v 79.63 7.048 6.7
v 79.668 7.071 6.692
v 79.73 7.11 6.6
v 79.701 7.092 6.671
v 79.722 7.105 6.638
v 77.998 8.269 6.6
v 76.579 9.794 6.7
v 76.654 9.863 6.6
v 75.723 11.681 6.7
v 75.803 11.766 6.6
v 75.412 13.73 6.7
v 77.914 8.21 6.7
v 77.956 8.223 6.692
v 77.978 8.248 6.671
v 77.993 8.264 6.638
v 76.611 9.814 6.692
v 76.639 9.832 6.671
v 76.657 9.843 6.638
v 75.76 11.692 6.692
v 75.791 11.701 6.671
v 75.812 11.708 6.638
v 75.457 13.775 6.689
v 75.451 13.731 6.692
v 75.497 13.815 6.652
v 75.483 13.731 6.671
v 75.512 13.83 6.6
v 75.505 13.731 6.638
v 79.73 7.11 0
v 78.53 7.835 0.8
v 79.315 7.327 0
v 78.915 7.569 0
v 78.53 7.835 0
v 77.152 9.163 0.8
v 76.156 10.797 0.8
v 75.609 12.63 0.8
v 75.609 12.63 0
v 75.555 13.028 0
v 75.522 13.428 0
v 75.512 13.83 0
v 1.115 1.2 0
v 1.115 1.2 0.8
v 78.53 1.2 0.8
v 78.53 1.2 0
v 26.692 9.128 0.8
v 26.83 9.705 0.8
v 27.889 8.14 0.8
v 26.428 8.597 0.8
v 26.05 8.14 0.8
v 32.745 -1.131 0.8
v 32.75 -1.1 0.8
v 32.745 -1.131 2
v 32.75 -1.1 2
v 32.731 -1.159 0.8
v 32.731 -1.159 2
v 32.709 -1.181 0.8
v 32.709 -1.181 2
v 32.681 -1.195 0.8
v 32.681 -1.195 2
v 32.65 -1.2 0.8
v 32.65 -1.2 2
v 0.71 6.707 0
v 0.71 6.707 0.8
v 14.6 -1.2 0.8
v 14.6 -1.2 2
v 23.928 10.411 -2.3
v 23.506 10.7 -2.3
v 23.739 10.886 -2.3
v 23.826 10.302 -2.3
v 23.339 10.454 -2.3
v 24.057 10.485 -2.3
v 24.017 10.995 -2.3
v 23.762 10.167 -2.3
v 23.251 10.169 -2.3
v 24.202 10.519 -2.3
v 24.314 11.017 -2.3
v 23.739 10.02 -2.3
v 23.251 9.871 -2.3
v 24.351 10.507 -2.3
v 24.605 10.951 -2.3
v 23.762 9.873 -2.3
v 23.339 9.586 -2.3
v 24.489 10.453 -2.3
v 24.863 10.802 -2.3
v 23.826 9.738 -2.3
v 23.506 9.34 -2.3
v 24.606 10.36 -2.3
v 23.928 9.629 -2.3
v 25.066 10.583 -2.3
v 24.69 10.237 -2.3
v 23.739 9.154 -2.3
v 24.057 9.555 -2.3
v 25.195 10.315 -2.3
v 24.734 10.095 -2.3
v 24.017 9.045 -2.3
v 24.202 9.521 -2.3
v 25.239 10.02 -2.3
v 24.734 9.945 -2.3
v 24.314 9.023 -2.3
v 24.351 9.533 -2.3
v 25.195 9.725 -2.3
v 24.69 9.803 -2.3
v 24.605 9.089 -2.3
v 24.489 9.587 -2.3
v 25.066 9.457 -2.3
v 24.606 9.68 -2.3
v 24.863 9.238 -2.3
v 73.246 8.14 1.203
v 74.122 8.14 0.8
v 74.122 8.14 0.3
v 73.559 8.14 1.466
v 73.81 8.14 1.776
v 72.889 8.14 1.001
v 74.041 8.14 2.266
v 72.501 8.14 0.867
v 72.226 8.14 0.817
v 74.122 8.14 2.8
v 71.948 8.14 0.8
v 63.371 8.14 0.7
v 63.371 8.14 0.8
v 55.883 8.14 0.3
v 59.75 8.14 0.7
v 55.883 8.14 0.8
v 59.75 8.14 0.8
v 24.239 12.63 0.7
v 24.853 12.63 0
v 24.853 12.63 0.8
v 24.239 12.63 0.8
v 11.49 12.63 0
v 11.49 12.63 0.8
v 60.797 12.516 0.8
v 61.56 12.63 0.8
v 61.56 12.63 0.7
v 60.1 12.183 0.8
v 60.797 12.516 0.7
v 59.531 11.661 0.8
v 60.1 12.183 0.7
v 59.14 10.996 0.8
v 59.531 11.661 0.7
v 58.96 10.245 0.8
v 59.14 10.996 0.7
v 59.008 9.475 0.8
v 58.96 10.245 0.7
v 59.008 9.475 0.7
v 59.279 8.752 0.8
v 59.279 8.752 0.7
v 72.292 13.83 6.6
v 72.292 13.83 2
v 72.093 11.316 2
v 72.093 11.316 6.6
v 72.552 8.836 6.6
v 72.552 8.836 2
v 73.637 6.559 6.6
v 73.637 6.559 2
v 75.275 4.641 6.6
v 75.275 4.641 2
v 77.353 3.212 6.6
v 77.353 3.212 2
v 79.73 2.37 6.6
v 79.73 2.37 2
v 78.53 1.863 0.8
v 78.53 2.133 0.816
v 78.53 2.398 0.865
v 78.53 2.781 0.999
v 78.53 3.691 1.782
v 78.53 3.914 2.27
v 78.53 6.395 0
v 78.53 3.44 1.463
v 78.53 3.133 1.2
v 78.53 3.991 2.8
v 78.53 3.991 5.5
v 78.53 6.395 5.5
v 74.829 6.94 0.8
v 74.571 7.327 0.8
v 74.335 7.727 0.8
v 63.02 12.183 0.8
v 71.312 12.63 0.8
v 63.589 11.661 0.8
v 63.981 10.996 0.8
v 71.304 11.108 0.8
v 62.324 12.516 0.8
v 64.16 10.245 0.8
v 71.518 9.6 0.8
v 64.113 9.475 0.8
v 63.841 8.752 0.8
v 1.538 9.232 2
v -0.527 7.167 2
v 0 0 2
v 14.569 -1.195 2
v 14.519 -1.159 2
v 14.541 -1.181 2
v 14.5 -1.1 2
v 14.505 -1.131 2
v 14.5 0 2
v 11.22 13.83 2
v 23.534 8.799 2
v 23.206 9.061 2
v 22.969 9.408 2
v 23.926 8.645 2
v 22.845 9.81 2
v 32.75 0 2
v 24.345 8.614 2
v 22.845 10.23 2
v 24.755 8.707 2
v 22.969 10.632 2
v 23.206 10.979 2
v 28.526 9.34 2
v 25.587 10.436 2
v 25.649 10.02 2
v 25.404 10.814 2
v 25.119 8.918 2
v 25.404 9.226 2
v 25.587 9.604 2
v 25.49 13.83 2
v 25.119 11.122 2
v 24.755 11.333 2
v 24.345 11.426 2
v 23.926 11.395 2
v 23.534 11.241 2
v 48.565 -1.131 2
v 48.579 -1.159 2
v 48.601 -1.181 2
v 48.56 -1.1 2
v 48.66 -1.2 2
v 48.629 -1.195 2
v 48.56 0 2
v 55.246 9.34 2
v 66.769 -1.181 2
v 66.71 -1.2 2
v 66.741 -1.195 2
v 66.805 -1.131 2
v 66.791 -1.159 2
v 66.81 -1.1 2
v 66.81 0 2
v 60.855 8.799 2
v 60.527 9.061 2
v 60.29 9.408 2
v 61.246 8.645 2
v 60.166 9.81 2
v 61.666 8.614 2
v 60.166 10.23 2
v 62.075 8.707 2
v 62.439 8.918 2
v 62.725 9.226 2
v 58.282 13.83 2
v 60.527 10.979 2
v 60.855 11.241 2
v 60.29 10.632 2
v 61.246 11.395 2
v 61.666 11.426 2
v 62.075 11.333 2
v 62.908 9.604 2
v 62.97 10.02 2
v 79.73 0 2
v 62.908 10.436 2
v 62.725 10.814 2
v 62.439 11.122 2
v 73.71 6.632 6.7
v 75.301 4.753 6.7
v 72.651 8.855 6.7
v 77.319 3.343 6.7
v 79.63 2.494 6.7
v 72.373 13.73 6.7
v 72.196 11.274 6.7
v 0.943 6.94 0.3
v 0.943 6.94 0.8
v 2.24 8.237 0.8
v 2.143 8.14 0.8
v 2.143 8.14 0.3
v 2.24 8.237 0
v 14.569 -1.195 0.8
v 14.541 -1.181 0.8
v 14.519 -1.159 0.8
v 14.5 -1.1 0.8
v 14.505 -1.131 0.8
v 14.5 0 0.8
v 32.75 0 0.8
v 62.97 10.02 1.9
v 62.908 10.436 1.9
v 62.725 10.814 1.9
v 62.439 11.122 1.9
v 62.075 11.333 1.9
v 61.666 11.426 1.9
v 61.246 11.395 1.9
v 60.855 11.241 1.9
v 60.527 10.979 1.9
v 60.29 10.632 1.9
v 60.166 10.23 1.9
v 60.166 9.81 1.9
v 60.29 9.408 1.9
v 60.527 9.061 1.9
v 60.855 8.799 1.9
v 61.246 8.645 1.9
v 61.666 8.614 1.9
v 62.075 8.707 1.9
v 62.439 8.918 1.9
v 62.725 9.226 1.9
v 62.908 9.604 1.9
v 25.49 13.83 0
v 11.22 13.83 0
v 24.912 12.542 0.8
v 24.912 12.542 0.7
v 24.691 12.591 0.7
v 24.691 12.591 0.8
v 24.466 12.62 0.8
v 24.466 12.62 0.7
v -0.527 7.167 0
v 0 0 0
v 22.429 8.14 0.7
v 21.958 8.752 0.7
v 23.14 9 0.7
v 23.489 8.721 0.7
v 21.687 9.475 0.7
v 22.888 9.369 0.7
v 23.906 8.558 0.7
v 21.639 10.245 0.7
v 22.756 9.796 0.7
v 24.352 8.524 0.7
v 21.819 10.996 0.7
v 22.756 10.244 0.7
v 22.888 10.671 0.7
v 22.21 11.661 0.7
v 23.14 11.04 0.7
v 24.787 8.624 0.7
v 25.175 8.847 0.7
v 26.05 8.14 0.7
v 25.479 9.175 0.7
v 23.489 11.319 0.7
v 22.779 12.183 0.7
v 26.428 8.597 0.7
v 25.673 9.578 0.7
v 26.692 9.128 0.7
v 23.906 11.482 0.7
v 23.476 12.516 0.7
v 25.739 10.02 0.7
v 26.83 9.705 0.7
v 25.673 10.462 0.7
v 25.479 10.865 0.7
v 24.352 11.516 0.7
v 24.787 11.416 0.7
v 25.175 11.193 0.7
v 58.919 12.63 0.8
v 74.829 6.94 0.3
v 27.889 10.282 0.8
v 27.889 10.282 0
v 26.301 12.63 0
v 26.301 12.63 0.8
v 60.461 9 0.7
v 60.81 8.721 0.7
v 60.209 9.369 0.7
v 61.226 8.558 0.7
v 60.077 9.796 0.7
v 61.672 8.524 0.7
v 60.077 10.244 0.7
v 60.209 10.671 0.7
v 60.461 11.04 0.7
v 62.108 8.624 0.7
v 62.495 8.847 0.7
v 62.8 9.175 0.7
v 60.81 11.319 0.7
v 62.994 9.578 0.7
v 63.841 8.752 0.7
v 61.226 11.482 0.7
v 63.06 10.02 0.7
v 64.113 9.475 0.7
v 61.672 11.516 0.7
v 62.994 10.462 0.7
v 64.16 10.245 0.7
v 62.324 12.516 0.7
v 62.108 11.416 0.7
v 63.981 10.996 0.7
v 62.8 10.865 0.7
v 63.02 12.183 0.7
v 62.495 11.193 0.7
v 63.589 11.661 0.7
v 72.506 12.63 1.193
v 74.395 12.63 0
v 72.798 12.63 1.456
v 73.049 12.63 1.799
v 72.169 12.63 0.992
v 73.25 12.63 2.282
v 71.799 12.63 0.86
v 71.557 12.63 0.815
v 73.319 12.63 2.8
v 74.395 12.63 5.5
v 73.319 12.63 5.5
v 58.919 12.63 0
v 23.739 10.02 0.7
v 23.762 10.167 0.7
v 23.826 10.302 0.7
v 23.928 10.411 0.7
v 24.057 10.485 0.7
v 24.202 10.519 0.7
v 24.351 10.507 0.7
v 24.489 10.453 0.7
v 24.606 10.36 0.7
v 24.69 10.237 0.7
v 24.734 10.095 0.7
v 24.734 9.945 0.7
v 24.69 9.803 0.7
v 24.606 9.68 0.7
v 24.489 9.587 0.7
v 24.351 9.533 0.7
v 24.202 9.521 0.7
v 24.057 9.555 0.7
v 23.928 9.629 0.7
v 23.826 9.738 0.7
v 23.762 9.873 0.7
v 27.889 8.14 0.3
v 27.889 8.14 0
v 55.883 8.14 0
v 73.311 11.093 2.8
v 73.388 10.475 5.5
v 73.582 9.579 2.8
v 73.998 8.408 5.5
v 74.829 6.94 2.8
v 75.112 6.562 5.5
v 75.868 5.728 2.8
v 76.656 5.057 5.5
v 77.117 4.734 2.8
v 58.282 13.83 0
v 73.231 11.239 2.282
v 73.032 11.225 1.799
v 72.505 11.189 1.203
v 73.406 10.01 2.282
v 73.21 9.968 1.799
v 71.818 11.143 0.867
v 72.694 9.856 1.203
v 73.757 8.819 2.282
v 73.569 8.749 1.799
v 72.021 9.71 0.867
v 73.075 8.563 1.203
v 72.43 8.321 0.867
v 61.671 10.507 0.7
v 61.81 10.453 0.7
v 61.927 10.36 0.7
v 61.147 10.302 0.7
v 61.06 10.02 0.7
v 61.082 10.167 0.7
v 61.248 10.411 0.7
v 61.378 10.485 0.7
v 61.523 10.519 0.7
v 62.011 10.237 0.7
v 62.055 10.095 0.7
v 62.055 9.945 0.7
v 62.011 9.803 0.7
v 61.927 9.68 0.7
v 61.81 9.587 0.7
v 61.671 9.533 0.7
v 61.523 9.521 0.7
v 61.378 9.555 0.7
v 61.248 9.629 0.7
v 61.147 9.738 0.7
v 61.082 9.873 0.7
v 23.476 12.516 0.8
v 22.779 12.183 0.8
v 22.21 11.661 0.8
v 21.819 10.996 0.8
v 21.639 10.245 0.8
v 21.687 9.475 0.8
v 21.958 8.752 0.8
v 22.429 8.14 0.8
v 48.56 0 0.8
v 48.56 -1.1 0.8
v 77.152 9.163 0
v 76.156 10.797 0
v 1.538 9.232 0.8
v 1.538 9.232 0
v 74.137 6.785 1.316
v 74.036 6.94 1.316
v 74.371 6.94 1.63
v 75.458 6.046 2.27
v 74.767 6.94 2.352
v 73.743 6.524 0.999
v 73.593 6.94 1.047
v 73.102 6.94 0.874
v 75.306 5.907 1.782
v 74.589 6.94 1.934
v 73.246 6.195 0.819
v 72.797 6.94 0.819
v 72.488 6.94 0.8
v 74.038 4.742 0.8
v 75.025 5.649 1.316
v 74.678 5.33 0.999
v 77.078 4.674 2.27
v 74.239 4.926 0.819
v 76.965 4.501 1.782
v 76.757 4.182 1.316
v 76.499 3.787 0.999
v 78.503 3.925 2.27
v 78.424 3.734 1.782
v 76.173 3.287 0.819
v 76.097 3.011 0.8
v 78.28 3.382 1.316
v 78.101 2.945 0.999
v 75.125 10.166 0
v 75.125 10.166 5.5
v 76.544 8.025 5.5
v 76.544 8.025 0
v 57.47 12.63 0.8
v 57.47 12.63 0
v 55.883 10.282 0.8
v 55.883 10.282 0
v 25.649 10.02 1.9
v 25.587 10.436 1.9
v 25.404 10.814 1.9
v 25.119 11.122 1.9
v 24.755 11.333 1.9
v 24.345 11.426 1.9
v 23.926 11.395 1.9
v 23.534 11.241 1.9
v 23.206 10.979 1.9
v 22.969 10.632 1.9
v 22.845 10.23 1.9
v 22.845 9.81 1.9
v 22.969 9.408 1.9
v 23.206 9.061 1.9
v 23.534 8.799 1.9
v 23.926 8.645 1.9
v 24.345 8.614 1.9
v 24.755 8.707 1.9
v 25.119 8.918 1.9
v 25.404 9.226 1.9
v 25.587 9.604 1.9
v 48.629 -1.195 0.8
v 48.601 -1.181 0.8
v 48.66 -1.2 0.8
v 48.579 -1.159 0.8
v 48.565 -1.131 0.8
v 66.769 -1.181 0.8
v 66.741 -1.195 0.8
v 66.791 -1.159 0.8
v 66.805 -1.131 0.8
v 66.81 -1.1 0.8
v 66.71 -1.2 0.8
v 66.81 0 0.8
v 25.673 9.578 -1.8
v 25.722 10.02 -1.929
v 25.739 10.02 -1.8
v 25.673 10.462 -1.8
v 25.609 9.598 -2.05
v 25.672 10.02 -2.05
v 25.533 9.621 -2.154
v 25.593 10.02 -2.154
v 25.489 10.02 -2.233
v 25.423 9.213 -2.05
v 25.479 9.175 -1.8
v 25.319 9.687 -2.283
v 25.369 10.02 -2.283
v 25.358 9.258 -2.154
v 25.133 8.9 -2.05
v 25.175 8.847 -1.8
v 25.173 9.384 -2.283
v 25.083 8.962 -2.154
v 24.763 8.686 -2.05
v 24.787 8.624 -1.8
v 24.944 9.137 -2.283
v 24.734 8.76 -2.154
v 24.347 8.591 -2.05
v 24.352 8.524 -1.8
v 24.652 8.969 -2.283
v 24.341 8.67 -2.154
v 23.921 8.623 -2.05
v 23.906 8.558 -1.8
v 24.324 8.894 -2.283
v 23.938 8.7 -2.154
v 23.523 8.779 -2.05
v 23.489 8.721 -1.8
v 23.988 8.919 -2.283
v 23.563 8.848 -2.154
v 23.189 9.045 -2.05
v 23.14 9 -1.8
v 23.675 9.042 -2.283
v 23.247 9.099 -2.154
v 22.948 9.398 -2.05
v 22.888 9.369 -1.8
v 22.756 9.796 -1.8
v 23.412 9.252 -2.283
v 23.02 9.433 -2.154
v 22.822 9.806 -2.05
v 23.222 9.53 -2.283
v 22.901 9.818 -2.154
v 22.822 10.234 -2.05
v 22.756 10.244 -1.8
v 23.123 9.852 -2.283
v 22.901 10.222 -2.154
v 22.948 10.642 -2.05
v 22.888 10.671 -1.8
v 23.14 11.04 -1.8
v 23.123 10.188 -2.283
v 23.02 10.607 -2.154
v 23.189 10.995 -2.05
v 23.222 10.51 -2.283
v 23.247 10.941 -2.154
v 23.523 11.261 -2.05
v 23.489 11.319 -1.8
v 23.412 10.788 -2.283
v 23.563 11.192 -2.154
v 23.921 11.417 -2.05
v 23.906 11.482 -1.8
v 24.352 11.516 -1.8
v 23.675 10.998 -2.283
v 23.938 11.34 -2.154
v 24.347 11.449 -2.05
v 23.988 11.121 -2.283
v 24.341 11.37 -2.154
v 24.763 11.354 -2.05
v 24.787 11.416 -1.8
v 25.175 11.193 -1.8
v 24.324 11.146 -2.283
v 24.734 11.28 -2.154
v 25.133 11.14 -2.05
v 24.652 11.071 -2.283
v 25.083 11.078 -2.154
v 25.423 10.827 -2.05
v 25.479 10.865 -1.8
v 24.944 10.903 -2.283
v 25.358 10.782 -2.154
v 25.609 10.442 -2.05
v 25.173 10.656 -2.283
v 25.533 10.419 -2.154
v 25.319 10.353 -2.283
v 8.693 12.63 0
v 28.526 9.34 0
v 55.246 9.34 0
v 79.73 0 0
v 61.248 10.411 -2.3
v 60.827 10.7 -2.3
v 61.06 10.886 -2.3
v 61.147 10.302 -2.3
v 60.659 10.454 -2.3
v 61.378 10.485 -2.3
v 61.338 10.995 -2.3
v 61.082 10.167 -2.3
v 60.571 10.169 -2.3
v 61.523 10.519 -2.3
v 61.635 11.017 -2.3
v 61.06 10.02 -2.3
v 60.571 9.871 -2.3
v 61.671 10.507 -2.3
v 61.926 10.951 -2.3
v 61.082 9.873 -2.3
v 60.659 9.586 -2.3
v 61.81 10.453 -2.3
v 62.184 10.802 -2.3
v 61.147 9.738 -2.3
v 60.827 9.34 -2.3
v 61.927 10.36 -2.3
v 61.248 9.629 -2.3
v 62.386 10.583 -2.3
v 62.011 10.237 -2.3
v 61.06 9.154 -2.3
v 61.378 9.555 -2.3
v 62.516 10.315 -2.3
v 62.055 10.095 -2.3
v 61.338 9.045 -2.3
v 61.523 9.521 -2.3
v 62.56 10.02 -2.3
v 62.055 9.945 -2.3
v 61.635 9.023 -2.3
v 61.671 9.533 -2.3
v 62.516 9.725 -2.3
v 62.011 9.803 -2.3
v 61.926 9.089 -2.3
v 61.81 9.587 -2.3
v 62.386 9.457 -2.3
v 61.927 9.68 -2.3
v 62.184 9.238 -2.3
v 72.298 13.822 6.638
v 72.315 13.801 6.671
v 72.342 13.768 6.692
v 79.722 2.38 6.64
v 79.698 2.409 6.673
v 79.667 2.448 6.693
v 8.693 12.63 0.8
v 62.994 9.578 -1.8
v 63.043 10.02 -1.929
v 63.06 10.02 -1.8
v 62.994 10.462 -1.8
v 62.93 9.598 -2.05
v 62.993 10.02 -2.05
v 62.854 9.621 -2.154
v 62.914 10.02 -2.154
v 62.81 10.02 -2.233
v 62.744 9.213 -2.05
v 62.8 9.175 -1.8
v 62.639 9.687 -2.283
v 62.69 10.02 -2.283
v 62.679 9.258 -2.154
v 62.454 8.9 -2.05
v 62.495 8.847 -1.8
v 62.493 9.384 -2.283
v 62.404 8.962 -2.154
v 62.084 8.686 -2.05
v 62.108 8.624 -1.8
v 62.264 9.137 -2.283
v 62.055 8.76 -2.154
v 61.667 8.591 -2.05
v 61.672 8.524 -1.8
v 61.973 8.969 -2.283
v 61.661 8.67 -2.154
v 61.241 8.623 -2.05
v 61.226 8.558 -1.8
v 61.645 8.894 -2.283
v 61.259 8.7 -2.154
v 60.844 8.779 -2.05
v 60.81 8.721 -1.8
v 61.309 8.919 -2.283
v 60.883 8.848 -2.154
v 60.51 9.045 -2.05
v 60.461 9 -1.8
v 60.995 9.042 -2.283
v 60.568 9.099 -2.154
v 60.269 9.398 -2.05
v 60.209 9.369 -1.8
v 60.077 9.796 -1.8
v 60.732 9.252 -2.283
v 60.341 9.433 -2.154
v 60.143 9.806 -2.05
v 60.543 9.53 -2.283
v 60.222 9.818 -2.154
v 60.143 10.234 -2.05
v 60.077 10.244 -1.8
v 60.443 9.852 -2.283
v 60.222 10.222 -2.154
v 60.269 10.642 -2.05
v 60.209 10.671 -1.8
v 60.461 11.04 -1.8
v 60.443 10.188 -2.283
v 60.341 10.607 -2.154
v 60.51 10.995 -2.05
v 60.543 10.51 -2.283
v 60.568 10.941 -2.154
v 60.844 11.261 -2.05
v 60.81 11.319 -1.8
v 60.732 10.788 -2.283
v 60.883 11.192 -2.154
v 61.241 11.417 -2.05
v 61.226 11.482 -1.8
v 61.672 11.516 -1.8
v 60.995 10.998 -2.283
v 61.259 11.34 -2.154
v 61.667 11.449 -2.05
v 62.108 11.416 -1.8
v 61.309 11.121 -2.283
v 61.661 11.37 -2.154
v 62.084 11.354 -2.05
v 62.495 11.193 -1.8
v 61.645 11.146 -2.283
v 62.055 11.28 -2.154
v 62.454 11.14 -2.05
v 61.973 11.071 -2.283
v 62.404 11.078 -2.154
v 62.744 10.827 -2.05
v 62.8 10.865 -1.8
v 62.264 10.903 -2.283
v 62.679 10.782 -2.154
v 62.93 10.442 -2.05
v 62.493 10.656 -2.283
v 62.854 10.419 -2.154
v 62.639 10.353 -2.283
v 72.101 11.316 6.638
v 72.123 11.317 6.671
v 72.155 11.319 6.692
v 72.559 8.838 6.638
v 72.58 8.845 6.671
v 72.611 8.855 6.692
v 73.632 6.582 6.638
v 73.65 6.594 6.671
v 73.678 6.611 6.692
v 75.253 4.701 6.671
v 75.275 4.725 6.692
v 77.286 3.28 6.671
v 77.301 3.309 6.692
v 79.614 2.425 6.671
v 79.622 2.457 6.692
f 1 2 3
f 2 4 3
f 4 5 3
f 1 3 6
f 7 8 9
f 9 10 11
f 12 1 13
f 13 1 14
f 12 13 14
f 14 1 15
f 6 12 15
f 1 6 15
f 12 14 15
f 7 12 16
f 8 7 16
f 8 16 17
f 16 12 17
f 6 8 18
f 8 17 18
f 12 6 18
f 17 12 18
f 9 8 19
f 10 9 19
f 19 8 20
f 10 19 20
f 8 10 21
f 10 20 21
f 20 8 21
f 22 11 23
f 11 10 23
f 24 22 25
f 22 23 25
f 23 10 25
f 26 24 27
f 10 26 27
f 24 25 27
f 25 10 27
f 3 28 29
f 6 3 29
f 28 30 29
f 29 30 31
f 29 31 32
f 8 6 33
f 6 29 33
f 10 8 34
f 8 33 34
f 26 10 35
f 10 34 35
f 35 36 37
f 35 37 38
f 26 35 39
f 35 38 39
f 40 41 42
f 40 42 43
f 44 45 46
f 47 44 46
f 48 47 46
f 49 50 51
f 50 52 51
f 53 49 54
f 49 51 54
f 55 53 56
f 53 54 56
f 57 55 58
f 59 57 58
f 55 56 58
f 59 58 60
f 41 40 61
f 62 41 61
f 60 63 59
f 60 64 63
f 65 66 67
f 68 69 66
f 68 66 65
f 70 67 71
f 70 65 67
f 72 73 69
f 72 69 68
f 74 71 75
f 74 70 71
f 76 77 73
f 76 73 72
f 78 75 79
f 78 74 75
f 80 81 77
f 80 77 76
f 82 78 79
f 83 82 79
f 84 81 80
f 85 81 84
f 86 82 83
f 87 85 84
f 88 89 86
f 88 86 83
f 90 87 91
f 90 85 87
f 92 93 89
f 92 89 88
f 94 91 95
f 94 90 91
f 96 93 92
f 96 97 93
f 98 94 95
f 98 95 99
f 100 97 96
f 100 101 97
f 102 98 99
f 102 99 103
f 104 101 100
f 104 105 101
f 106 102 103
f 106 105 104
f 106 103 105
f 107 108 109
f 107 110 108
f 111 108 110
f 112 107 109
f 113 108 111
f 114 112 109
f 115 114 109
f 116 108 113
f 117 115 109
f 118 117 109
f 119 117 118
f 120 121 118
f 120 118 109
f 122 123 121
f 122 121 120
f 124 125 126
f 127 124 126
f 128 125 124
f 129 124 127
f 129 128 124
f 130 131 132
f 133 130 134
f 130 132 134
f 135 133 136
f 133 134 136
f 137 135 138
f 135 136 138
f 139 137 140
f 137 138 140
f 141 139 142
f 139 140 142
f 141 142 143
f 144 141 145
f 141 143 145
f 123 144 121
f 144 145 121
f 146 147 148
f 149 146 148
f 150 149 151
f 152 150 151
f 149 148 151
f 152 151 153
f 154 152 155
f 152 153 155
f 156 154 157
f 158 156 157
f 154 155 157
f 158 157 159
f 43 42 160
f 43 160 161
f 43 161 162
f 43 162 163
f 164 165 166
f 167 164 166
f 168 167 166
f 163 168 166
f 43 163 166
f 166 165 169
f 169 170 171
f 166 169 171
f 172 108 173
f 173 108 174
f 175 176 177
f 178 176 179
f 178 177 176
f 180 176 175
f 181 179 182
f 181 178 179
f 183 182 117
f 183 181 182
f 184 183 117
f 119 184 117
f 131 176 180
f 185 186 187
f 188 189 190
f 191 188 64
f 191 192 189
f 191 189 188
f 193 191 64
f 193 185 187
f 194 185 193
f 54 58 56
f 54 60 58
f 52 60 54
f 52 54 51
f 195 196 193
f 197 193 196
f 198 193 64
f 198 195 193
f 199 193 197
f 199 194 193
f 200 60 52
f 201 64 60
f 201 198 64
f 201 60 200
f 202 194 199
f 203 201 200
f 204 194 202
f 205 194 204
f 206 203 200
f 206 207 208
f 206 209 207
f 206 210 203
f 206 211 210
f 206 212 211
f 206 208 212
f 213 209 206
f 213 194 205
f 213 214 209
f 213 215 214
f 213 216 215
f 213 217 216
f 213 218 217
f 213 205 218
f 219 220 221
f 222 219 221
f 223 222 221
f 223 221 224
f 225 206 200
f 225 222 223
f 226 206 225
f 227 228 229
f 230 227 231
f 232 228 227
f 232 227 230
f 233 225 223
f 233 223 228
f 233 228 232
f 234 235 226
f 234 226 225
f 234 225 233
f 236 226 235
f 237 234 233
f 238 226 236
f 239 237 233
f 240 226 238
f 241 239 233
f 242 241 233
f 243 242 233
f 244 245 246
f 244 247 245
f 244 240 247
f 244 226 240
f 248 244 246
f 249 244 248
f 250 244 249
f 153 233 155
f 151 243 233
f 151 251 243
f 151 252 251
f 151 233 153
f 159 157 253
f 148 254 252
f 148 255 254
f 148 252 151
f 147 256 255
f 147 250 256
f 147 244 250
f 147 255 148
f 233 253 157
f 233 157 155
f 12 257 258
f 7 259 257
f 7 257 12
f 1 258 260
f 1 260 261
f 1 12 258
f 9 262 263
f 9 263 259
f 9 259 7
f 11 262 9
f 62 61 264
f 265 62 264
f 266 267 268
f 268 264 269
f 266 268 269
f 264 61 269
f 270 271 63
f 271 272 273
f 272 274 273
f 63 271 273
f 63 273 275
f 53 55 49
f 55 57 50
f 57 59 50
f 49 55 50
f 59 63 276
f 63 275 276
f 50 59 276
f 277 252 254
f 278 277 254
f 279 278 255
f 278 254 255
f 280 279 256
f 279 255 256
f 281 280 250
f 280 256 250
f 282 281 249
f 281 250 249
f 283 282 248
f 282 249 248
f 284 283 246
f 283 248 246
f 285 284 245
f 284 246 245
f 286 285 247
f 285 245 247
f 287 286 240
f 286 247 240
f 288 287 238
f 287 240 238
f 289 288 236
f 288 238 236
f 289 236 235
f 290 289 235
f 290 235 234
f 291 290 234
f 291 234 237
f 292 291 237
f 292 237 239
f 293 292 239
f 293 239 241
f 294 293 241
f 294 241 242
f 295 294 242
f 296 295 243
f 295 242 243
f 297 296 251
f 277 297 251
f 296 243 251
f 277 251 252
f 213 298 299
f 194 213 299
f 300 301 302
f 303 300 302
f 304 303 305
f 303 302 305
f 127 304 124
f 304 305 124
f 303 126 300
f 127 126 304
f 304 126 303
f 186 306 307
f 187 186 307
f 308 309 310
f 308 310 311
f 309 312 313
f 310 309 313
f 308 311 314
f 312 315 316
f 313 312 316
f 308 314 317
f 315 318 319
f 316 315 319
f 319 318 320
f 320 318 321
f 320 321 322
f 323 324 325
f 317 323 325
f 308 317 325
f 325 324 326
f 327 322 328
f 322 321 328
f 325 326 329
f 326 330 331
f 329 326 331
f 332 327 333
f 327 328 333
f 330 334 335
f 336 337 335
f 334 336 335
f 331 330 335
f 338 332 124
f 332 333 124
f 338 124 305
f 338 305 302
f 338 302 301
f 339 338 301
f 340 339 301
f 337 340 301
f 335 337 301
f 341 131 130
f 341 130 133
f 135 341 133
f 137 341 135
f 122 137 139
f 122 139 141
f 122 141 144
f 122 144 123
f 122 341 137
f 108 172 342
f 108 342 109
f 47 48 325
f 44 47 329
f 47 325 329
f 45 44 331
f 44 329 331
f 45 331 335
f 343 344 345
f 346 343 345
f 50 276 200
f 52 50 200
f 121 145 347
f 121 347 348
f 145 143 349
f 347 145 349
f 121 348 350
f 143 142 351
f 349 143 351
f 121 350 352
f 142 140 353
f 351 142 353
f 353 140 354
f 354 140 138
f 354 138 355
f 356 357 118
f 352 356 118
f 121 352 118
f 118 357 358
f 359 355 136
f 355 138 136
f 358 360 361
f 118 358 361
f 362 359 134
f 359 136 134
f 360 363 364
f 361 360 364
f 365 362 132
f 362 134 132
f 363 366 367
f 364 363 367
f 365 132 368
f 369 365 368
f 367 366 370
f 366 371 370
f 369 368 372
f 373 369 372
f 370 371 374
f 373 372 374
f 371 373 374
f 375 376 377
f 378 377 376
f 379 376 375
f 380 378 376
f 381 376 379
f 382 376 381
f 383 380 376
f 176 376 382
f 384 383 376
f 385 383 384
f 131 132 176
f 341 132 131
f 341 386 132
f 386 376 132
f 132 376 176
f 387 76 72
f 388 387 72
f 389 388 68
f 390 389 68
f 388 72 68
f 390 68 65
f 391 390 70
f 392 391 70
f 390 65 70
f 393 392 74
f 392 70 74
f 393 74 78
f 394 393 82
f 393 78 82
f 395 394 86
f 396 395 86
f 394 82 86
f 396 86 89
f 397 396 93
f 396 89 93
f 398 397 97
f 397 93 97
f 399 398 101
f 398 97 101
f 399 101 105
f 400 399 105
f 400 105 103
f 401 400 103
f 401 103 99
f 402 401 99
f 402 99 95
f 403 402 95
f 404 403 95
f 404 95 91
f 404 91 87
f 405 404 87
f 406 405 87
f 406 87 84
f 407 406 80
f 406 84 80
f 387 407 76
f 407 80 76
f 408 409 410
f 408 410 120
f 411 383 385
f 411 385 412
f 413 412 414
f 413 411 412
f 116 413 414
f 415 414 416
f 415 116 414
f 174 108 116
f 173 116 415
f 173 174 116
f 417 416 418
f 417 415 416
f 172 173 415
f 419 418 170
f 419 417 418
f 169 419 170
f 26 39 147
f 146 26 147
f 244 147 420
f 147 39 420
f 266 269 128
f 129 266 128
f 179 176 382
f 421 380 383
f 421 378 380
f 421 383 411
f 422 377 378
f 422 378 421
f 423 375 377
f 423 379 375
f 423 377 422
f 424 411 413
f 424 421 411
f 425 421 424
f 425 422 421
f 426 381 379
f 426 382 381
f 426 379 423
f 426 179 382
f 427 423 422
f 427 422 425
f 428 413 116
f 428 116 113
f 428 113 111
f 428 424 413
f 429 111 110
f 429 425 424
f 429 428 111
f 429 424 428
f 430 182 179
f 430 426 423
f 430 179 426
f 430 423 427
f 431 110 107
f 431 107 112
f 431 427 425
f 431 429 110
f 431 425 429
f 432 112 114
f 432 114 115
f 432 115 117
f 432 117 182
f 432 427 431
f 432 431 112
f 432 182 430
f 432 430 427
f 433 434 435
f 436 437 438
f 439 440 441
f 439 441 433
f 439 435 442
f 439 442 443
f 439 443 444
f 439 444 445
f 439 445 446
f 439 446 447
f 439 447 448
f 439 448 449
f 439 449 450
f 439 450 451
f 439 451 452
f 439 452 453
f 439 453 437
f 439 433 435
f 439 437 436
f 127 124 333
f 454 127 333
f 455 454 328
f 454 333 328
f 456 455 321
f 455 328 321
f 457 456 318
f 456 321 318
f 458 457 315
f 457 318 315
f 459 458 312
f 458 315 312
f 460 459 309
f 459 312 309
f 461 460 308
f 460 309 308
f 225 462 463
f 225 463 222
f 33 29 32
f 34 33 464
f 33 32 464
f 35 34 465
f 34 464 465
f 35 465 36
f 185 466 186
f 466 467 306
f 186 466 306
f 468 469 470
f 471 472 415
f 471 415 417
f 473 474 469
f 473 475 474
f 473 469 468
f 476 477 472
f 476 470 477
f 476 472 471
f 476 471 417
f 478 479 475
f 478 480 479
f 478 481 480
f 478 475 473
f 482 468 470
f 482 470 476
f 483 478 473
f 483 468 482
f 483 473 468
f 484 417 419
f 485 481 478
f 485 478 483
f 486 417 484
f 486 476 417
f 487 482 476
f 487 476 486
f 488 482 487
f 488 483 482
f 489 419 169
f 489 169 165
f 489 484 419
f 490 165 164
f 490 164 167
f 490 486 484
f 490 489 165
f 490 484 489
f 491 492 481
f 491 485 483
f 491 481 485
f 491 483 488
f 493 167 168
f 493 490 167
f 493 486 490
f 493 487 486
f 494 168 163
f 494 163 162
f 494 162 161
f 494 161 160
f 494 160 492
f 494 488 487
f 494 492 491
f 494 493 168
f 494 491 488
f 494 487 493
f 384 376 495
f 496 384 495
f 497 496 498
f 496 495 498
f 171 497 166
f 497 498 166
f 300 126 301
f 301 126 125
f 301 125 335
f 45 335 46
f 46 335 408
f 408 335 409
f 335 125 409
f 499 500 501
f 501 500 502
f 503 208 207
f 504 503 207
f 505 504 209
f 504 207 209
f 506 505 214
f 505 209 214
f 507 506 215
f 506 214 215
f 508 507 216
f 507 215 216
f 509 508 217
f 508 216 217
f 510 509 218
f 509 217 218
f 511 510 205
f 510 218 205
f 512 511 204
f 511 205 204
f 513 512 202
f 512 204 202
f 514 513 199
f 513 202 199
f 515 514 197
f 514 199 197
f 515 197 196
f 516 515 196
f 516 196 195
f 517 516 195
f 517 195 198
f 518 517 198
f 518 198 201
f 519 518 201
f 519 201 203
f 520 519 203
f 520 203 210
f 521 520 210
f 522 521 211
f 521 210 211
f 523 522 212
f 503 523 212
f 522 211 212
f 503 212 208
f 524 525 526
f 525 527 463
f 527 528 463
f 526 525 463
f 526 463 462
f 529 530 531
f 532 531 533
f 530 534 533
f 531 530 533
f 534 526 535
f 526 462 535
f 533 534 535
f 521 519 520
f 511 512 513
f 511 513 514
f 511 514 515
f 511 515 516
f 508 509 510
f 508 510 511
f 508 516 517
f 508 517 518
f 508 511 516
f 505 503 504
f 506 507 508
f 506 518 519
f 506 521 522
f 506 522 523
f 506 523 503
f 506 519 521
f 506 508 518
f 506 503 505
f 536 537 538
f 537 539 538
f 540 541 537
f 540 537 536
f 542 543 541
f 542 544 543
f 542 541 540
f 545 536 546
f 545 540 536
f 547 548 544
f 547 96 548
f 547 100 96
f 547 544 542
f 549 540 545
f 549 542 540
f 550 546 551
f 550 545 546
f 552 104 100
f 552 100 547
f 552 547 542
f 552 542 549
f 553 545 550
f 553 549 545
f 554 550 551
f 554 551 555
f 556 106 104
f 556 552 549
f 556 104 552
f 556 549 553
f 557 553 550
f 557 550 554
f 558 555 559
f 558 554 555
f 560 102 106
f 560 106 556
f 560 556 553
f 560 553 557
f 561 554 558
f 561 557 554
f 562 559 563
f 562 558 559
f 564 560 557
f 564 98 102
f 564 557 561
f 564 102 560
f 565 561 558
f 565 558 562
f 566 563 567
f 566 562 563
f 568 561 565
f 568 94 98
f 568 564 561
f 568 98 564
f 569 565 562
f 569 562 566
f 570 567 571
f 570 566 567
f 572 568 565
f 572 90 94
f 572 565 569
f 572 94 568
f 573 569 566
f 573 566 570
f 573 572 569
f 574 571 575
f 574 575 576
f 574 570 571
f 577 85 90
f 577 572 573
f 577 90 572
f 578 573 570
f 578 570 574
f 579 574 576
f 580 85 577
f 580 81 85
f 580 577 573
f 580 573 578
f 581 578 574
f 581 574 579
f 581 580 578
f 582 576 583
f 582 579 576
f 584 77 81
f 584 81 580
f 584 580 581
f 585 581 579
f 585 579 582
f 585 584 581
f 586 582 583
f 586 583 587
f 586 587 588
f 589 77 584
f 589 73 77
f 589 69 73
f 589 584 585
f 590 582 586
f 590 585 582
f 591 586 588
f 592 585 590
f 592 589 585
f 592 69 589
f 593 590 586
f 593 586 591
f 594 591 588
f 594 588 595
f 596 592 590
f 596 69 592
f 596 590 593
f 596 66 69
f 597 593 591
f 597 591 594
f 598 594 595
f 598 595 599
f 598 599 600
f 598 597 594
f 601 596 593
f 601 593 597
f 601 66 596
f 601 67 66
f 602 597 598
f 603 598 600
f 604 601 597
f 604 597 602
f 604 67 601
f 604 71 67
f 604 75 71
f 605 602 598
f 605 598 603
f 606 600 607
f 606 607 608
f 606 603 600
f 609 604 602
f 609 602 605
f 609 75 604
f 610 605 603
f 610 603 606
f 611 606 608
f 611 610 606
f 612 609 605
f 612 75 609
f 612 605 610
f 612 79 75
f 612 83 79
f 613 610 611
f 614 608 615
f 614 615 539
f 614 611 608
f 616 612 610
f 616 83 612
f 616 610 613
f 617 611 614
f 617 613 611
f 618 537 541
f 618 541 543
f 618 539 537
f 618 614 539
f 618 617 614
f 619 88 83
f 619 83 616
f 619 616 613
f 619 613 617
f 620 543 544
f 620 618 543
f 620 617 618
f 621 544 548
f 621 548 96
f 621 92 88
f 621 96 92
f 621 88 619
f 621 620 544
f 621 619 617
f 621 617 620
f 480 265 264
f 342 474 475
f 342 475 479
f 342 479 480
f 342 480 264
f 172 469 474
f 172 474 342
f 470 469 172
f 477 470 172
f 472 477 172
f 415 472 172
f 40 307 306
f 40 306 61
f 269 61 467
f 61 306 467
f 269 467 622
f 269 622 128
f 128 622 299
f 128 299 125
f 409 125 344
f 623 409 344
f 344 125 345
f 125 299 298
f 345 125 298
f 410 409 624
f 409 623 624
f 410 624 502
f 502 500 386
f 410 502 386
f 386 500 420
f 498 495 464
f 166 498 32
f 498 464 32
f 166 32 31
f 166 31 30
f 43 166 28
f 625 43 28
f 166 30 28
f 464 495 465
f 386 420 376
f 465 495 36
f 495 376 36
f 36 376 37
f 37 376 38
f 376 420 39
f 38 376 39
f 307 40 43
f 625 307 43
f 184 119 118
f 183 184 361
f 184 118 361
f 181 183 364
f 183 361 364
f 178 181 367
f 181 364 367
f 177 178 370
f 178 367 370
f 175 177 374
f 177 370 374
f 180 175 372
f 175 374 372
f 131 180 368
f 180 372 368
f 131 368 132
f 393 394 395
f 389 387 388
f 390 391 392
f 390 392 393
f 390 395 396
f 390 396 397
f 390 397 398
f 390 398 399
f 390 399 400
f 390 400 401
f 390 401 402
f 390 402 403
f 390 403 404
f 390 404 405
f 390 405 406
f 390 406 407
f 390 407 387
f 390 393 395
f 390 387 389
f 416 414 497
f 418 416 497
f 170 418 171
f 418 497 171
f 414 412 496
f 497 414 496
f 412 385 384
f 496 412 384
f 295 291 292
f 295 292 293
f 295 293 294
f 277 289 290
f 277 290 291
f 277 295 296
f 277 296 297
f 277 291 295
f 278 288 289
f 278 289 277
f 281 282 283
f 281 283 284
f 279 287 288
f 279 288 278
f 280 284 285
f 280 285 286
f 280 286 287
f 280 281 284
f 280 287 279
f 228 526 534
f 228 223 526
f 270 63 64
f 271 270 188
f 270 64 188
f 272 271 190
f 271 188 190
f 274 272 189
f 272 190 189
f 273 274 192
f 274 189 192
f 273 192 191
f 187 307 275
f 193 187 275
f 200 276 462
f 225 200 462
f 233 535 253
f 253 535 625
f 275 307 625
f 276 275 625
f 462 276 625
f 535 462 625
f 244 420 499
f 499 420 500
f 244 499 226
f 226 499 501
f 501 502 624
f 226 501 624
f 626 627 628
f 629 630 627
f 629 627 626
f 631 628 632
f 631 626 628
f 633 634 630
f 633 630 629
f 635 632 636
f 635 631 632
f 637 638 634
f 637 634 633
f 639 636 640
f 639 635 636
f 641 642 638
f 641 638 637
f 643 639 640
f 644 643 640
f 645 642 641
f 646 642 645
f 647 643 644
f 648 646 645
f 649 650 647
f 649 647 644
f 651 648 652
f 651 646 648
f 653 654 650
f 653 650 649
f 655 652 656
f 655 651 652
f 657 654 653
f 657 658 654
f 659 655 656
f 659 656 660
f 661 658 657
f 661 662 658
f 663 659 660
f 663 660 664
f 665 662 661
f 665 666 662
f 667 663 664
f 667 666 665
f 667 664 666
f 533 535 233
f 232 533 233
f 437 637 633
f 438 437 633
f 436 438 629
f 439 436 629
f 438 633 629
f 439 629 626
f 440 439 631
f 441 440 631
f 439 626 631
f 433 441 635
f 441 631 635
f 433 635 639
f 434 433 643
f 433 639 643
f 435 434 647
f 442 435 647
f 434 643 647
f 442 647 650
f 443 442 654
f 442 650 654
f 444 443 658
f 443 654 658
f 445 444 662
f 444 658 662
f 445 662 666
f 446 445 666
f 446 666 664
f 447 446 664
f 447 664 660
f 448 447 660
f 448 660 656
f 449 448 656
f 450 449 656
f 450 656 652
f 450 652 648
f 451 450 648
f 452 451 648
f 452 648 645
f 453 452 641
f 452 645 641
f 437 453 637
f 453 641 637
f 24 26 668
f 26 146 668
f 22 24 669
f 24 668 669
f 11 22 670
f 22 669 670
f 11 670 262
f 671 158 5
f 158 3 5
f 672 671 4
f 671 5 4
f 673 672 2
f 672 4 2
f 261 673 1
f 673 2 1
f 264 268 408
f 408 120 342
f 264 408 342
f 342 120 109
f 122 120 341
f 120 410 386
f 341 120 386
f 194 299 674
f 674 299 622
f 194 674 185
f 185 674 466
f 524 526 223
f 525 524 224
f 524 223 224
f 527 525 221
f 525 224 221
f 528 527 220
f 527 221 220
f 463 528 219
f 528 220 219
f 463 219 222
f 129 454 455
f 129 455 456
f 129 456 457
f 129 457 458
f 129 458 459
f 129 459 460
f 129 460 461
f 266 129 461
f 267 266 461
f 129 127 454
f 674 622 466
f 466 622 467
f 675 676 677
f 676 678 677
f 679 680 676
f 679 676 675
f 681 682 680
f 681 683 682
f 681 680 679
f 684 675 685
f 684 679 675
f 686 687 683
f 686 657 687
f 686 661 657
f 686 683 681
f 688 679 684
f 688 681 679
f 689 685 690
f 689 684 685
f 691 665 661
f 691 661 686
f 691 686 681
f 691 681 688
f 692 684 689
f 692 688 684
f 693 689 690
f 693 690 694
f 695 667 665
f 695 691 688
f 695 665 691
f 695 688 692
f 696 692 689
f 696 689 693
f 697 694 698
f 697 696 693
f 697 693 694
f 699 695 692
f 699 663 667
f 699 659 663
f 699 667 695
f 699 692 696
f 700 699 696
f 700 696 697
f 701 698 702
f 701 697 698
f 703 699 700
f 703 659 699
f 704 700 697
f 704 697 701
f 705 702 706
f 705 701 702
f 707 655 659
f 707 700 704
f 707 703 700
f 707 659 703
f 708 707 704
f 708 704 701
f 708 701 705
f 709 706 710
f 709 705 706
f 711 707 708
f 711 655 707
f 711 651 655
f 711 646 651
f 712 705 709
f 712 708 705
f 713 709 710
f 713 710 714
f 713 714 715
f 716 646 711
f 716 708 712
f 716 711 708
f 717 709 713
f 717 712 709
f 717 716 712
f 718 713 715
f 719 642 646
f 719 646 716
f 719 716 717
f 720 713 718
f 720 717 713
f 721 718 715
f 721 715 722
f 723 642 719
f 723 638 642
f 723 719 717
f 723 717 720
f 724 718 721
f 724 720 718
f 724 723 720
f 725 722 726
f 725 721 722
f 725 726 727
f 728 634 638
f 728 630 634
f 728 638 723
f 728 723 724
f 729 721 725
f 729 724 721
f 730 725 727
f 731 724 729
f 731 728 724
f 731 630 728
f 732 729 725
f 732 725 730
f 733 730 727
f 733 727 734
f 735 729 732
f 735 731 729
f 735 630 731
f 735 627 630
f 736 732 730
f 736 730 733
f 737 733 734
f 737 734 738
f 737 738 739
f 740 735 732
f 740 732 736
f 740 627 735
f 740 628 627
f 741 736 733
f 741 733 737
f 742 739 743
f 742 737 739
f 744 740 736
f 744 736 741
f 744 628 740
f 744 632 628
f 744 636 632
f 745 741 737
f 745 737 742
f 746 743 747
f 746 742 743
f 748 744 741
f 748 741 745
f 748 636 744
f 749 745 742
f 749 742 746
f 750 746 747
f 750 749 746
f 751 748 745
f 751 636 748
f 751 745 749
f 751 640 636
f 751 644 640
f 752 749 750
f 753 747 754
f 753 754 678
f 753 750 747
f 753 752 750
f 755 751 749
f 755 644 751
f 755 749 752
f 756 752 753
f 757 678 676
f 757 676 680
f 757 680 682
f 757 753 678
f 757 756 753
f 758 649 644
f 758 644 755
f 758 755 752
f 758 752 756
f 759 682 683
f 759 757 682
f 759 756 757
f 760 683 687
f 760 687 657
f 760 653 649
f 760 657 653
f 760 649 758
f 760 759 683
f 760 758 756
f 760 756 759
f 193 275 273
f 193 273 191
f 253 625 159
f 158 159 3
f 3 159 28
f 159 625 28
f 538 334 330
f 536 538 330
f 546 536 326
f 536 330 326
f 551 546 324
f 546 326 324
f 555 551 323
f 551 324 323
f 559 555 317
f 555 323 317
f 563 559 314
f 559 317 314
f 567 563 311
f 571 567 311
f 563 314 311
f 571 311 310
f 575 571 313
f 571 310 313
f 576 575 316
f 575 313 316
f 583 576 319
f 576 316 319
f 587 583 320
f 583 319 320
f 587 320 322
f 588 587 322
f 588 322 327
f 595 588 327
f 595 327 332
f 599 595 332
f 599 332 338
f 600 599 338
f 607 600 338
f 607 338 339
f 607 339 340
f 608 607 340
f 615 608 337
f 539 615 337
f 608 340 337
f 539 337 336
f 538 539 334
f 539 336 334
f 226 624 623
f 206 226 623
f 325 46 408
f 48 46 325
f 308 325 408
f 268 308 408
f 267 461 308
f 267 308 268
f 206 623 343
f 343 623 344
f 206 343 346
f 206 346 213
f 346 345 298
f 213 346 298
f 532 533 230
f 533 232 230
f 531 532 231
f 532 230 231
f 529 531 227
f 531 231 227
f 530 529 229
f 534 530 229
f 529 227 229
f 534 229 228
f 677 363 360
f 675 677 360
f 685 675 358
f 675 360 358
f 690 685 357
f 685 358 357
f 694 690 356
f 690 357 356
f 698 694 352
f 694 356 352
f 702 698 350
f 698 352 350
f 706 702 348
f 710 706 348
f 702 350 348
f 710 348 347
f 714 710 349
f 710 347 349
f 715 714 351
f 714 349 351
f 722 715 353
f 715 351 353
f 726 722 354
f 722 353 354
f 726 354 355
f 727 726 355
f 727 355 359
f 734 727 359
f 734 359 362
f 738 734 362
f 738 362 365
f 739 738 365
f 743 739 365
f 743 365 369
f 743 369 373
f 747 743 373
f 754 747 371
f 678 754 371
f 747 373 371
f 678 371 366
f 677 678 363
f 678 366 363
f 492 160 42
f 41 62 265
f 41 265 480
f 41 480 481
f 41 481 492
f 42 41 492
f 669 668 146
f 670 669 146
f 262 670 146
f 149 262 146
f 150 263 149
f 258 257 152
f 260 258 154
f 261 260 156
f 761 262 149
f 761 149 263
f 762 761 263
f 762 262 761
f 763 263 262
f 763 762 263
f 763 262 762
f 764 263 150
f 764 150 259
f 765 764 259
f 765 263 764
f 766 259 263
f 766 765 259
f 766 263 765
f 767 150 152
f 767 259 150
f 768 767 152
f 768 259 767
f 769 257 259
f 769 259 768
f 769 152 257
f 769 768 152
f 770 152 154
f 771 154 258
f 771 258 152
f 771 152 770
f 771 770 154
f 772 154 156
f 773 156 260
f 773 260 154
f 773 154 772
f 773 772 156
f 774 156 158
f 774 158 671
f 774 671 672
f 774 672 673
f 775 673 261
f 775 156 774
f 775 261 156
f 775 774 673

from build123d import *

# Parameters (mm, degrees)
BOSS_EXTRUDE1_DEPTH = 2
SKETCH2_W           = 18.25
SKETCH2_H           = 1.2
BOSS_EXTRUDE2_DEPTH = 1.2
SKETCH3_W           = 18.25
SKETCH3_H           = 1.2
BOSS_EXTRUDE3_DEPTH = 1.2
FILLET1_R           = 0.1
FILLET2_R           = 0.1
FILLET3_R           = 0.1
FILLET4_R           = 0.1
SKETCH4_R           = 1.41
CUT_EXTRUDE1_DEPTH  = 0.1
BOSS_EXTRUDE4_DEPTH = 4.7
FILLET5_R           = 0.1
SHELL1_START        = 0.710139039
SHELL1_DEPTH        = 77.819860961
SHELL1_START_2      = 1.115016449
SHELL1_2_OUTLINE_W  = 4.49
SHELL1_2_OUTLINE_H  = 0.8
SHELL1_2_DEPTH      = 26.773626454
SHELL1_START_3      = 55.883029025
SHELL1_3_OUTLINE_W  = 4.49
SHELL1_3_OUTLINE_H  = 0.8
SHELL1_3_DEPTH      = 22.646970975
SHELL1_START_4      = 0.8
SHELL1_4_DEPTH      = 4.7
SHELL1_5_DEPTH      = 0.8
SHELL1_START_5      = 0.7
SHELL1_6_OUTLINE_R  = 2.61
SHELL1_6_DEPTH      = 0.1
BOSS_EXTRUDE5_DEPTH = 0.5
SKETCH7_R           = 1.5
BOSS_EXTRUDE6_DEPTH = 3
FILLET6_R           = 0.5
SKETCH8_R           = 0.5
CUT_EXTRUDE2_DEPTH  = 3
SKETCH9_R           = 1.5
BOSS_EXTRUDE7_DEPTH = 3
FILLET7_R           = 0.5
SKETCH10_R          = 0.5
CUT_EXTRUDE3_DEPTH  = 3
FILLET10_R          = 2
FILLET11_R          = 2


with BuildPart() as part:
    # Sketch1 → Boss-Extrude1 (new body)
    with BuildSketch(Plane.XY):
        with BuildLine():
            Line((0, 0), (79.73, 0))
            Line((79.73, 0), (79.73, 7.11))
            ThreePointArc((79.73, 7.11), (76.653638062, 9.862863384), (75.511671928, 13.83))
            Line((75.511671928, 13.83), (58.281671928, 13.83))
            Line((58.281671928, 13.83), (55.245835964, 9.34))
            Line((55.245835964, 9.34), (28.525835964, 9.34))
            Line((28.525835964, 9.34), (25.49, 13.83))
            Line((25.49, 13.83), (11.22, 13.83))
            Line((11.22, 13.83), (1.537833793, 9.231903563))
            Line((1.537833793, 9.231903563), (-0.526918008, 7.167151762))
            Line((-0.526918008, 7.167151762), (0, 0))
        make_face()
    extrude(amount=BOSS_EXTRUDE1_DEPTH)

    # Sketch2 → Boss-Extrude2 (add)
    with BuildSketch(Plane.XZ):
        with Locations((23.625, 1.4)):
            Rectangle(SKETCH2_W, SKETCH2_H)
    extrude(amount=BOSS_EXTRUDE2_DEPTH)

    # Sketch3 → Boss-Extrude3 (add)
    with BuildSketch(Plane.XZ):
        with Locations((57.685, 1.4)):
            Rectangle(SKETCH3_W, SKETCH3_H)
    extrude(amount=BOSS_EXTRUDE3_DEPTH)

    # Fillet1
    fillet1_edges = [part.edges().sort_by_distance(p)[0] for p in [
        (66.81, -1.2, 1.4),
    ]]
    fillet(fillet1_edges, radius=FILLET1_R)

    # Fillet2
    fillet2_edges = [part.edges().sort_by_distance(p)[0] for p in [
        (48.56, -1.2, 1.4),
    ]]
    fillet(fillet2_edges, radius=FILLET2_R)

    # Fillet3
    fillet3_edges = [part.edges().sort_by_distance(p)[0] for p in [
        (32.75, -1.2, 1.4),
    ]]
    fillet(fillet3_edges, radius=FILLET3_R)

    # Fillet4
    fillet4_edges = [part.edges().sort_by_distance(p)[0] for p in [
        (14.5, -1.2, 1.4),
    ]]
    fillet(fillet4_edges, radius=FILLET4_R)

    # Sketch4 → Cut-Extrude1 (cut)
    with BuildSketch(Plane.XY.offset(2)):
        with Locations((24.239473279, 10.02)):
            Circle(SKETCH4_R)
        with Locations((61.560171923, 10.02)):
            Circle(SKETCH4_R)
    extrude(amount=-CUT_EXTRUDE1_DEPTH, mode=Mode.SUBTRACT)

    # Sketch5 → Boss-Extrude4 (add)
    with BuildSketch(Plane.XY.offset(2)):
        with BuildLine():
            Line((75.511671928, 13.83), (72.291671928, 13.83))
            ThreePointArc((72.291671928, 13.83), (73.637392252, 6.559471816), (79.73, 2.37))
            Line((79.73, 2.37), (79.73, 7.11))
            ThreePointArc((79.73, 7.11), (76.653638062, 9.862863384), (75.511671928, 13.83))
        make_face()
    extrude(amount=BOSS_EXTRUDE4_DEPTH)

    # Fillet5
    fillet5_edges = [part.edges().sort_by_distance(p)[0] for p in [
        (76.653638062, 9.862863384, 6.7),
        (73.901671928, 13.83, 6.7),
        (73.637392252, 6.559471816, 6.7),
        (79.73, 4.74, 6.7),
    ]]
    fillet(fillet5_edges, radius=FILLET5_R)

    # Shell1: read off the stored shape, not the designer's step
    # Shell1 outline → Shell1 (cut)
    with BuildSketch(Plane.YZ.offset(SHELL1_START)):
        Polygon((8.14, 0.7), (8.14, 0.8), (1.2, 0.8), (1.2, 0), (8.14, 0), align=None)
    extrude(amount=SHELL1_DEPTH, mode=Mode.SUBTRACT)

    # Shell1 2 outline → Shell1 2 (cut)
    with BuildSketch(Plane.YZ.offset(SHELL1_START_2)):
        with Locations((10.385, 0.4)):
            Rectangle(SHELL1_2_OUTLINE_W, SHELL1_2_OUTLINE_H)
    extrude(amount=SHELL1_2_DEPTH, mode=Mode.SUBTRACT)

    # Shell1 3 outline → Shell1 3 (cut)
    with BuildSketch(Plane.YZ.offset(SHELL1_START_3)):
        with Locations((10.385, 0.4)):
            Rectangle(SHELL1_3_OUTLINE_W, SHELL1_3_OUTLINE_H)
    extrude(amount=SHELL1_3_DEPTH, mode=Mode.SUBTRACT)

    # Shell1 4 outline → Shell1 4 (cut)
    with BuildSketch(Plane.XY.offset(SHELL1_START_4)):
        with BuildLine():
            Line((78.53, 3.991336383), (78.53, 6.394787335))
            ThreePointArc((78.53, 6.394787335), (75.75468216, 9.042947573), (74.395198194, 12.63))
            Line((74.395198194, 12.63), (73.31902509, 12.63))
            ThreePointArc((73.31902509, 12.63), (74.496096812, 7.449025827), (78.53, 3.991336383))
        make_face()
    extrude(amount=SHELL1_4_DEPTH, mode=Mode.SUBTRACT)

    # Shell1 5 outline → Shell1 5 (add)
    with BuildSketch(Plane.XY):
        with BuildLine():
            Line((78.53, 6.394787335), (78.53, 7.835498111))
            ThreePointArc((78.53, 7.835498111), (76.601274587, 9.947529982), (75.608795397, 12.63))
            Line((75.608795397, 12.63), (74.395198194, 12.63))
            ThreePointArc((74.395198194, 12.63), (75.75468216, 9.042947573), (78.53, 6.394787335))
        make_face()
        Polygon((0.710139039, 1.2), (1.115016449, 1.2), (0.710139039, 6.707152534), align=None)
        Polygon((55.883029025, 8.14), (58.918864989, 12.63), (57.47031265, 12.63), (55.883029025, 10.282408245), align=None)
        Polygon((0.710139039, 8.14), (0.710139039, 6.707152534), (2.239820192, 8.236833687), (11.490467063, 12.63), (8.693171864, 12.63), (1.537833793, 9.231903563), (1.115016449, 8.809086219), (1.115016449, 8.14), align=None)
        Polygon((24.852806939, 12.63), (27.888642903, 8.14), (27.888642903, 10.282408245), (26.301359278, 12.63), align=None)
    extrude(amount=SHELL1_5_DEPTH)

    # Shell1 6 outline → Shell1 6 (add)
    with BuildSketch(Plane.XY.offset(SHELL1_START_5)):
        with Locations((61.560171923, 10.02)):
            Circle(SHELL1_6_OUTLINE_R)
        with BuildLine():
            ThreePointArc((24.912484692, 12.541736631), (22.077314607, 8.558093751), (26.830410206, 9.705125674))
            Line((26.830410206, 9.705125674), (24.912484692, 12.541736631))
        make_face()
    extrude(amount=SHELL1_6_DEPTH)

    # Sketch6 → Boss-Extrude5 (add)
    with BuildSketch(Plane(origin=(0, 0, 0.8), x_dir=(-1, 0, 0), z_dir=(0, 0, -1))):
        Polygon((-74.121905242, 8.14), (-2.142986505, 8.14), (-0.942986505, 6.94), (-74.828664694, 6.94), align=None)
    extrude(amount=BOSS_EXTRUDE5_DEPTH)

    # Sketch7 → Boss-Extrude6 (add)
    with BuildSketch(Plane(origin=(0, 0, 0.7), x_dir=(-1, 0, 0), z_dir=(0, 0, -1))):
        with Locations(Location((-61.560171923, 10.02, 0), (0, 0, 180))):
            Circle(SKETCH7_R)
    extrude(amount=BOSS_EXTRUDE6_DEPTH)

    # Fillet6
    fillet6_edges = [part.edges().sort_by_distance(p)[0] for p in [
        (60.060171923, 10.02, -2.3),
    ]]
    fillet(fillet6_edges, radius=FILLET6_R)

    # Sketch8 → Cut-Extrude2 (cut)
    with BuildSketch(Plane(origin=(0, 0, -2.3), x_dir=(-1, 0, 0), z_dir=(0, 0, -1))):
        with Locations((-61.560171923, 10.02)):
            Circle(SKETCH8_R)
    extrude(amount=-CUT_EXTRUDE2_DEPTH, mode=Mode.SUBTRACT)

    # Sketch9 → Boss-Extrude7 (add)
    with BuildSketch(Plane(origin=(0, 0, 0.7), x_dir=(-1, 0, 0), z_dir=(0, 0, -1))):
        with Locations(Location((-24.239473279, 10.02, 0), (0, 0, 180))):
            Circle(SKETCH9_R)
    extrude(amount=BOSS_EXTRUDE7_DEPTH)

    # Fillet7
    fillet7_edges = [part.edges().sort_by_distance(p)[0] for p in [
        (22.739473279, 10.02, -2.3),
    ]]
    fillet(fillet7_edges, radius=FILLET7_R)

    # Sketch10 → Cut-Extrude3 (cut)
    with BuildSketch(Plane(origin=(0, 0, -2.3), x_dir=(-1, 0, 0), z_dir=(0, 0, -1))):
        with Locations((-24.239473279, 10.02)):
            Circle(SKETCH10_R)
    extrude(amount=-CUT_EXTRUDE3_DEPTH, mode=Mode.SUBTRACT)

    # Fillet10
    # the kernel refuses this fillet: 2 mm, written as the material it takes off along each edge
    with BuildSketch(Plane(origin=(81.740835966, 11.819164038, 0.8), x_dir=(-0.7731681215232679, 0.634201116255862, 0), z_dir=(0.634201116255862, 0.7731681215232679, 0))) as fillet10_piece_1_section:
        with BuildLine():
            CenterArc((8.460753713 + FILLET10_R, FILLET10_R), FILLET10_R, 180, 90)
            Line((8.460753713, FILLET10_R), (8.460753713, 0))
            Line((8.460753713, 0), (8.460753713 + FILLET10_R, 0))
        make_face()
    fillet10_piece_1 = revolve(axis=Axis((81.740835966, 11.819164038, 0.8), (0, 0, 1)), revolution_arc=98.997926529, mode=Mode.PRIVATE)
    fillet10_piece_1 = split(fillet10_piece_1, bisect_by=Plane(origin=(81.740835966, 12.63, 0.8), z_dir=(0, -1, 0)), keep=Keep.TOP, mode=Mode.PRIVATE)
    fillet10_piece_1 = split(fillet10_piece_1, bisect_by=Plane(origin=(81.740835966, 8.14, 0.8), z_dir=(0, 1, 0)), keep=Keep.TOP, mode=Mode.PRIVATE)
    add(fillet10_piece_1, mode=Mode.SUBTRACT)

    # Fillet11
    # the kernel refuses this fillet: 2 mm, written as the material it takes off along each edge
    with BuildSketch(Plane(origin=(81.740835966, 11.819164038, 0.8), x_dir=(-0.9997199584304023, -0.023664418774073097, 0), z_dir=(-0.023664418774073097, 0.9997199584304023, 0))) as fillet11_piece_1_section:
        with BuildLine():
            CenterArc((8.460753713 + FILLET11_R, FILLET11_R), FILLET11_R, 180, 90)
            Line((8.460753713, FILLET11_R), (8.460753713, 0))
            Line((8.460753713, 0), (8.460753713 + FILLET11_R, 0))
        make_face()
    fillet11_piece_1 = revolve(axis=Axis((81.740835966, 11.819164038, 0.8), (0, 0, 1)), revolution_arc=100.202942333, mode=Mode.PRIVATE)
    fillet11_piece_1 = split(fillet11_piece_1, bisect_by=Plane(origin=(78.53, 11.819164038, 0.8), z_dir=(-1, 0, 0)), keep=Keep.TOP, mode=Mode.PRIVATE)
    fillet11_piece_1 = split(fillet11_piece_1, bisect_by=Plane(origin=(81.740835966, 6.94, 0.8), z_dir=(0, -1, 0)), keep=Keep.TOP, mode=Mode.PRIVATE)
    add(fillet11_piece_1, mode=Mode.SUBTRACT)


solid = part.part
